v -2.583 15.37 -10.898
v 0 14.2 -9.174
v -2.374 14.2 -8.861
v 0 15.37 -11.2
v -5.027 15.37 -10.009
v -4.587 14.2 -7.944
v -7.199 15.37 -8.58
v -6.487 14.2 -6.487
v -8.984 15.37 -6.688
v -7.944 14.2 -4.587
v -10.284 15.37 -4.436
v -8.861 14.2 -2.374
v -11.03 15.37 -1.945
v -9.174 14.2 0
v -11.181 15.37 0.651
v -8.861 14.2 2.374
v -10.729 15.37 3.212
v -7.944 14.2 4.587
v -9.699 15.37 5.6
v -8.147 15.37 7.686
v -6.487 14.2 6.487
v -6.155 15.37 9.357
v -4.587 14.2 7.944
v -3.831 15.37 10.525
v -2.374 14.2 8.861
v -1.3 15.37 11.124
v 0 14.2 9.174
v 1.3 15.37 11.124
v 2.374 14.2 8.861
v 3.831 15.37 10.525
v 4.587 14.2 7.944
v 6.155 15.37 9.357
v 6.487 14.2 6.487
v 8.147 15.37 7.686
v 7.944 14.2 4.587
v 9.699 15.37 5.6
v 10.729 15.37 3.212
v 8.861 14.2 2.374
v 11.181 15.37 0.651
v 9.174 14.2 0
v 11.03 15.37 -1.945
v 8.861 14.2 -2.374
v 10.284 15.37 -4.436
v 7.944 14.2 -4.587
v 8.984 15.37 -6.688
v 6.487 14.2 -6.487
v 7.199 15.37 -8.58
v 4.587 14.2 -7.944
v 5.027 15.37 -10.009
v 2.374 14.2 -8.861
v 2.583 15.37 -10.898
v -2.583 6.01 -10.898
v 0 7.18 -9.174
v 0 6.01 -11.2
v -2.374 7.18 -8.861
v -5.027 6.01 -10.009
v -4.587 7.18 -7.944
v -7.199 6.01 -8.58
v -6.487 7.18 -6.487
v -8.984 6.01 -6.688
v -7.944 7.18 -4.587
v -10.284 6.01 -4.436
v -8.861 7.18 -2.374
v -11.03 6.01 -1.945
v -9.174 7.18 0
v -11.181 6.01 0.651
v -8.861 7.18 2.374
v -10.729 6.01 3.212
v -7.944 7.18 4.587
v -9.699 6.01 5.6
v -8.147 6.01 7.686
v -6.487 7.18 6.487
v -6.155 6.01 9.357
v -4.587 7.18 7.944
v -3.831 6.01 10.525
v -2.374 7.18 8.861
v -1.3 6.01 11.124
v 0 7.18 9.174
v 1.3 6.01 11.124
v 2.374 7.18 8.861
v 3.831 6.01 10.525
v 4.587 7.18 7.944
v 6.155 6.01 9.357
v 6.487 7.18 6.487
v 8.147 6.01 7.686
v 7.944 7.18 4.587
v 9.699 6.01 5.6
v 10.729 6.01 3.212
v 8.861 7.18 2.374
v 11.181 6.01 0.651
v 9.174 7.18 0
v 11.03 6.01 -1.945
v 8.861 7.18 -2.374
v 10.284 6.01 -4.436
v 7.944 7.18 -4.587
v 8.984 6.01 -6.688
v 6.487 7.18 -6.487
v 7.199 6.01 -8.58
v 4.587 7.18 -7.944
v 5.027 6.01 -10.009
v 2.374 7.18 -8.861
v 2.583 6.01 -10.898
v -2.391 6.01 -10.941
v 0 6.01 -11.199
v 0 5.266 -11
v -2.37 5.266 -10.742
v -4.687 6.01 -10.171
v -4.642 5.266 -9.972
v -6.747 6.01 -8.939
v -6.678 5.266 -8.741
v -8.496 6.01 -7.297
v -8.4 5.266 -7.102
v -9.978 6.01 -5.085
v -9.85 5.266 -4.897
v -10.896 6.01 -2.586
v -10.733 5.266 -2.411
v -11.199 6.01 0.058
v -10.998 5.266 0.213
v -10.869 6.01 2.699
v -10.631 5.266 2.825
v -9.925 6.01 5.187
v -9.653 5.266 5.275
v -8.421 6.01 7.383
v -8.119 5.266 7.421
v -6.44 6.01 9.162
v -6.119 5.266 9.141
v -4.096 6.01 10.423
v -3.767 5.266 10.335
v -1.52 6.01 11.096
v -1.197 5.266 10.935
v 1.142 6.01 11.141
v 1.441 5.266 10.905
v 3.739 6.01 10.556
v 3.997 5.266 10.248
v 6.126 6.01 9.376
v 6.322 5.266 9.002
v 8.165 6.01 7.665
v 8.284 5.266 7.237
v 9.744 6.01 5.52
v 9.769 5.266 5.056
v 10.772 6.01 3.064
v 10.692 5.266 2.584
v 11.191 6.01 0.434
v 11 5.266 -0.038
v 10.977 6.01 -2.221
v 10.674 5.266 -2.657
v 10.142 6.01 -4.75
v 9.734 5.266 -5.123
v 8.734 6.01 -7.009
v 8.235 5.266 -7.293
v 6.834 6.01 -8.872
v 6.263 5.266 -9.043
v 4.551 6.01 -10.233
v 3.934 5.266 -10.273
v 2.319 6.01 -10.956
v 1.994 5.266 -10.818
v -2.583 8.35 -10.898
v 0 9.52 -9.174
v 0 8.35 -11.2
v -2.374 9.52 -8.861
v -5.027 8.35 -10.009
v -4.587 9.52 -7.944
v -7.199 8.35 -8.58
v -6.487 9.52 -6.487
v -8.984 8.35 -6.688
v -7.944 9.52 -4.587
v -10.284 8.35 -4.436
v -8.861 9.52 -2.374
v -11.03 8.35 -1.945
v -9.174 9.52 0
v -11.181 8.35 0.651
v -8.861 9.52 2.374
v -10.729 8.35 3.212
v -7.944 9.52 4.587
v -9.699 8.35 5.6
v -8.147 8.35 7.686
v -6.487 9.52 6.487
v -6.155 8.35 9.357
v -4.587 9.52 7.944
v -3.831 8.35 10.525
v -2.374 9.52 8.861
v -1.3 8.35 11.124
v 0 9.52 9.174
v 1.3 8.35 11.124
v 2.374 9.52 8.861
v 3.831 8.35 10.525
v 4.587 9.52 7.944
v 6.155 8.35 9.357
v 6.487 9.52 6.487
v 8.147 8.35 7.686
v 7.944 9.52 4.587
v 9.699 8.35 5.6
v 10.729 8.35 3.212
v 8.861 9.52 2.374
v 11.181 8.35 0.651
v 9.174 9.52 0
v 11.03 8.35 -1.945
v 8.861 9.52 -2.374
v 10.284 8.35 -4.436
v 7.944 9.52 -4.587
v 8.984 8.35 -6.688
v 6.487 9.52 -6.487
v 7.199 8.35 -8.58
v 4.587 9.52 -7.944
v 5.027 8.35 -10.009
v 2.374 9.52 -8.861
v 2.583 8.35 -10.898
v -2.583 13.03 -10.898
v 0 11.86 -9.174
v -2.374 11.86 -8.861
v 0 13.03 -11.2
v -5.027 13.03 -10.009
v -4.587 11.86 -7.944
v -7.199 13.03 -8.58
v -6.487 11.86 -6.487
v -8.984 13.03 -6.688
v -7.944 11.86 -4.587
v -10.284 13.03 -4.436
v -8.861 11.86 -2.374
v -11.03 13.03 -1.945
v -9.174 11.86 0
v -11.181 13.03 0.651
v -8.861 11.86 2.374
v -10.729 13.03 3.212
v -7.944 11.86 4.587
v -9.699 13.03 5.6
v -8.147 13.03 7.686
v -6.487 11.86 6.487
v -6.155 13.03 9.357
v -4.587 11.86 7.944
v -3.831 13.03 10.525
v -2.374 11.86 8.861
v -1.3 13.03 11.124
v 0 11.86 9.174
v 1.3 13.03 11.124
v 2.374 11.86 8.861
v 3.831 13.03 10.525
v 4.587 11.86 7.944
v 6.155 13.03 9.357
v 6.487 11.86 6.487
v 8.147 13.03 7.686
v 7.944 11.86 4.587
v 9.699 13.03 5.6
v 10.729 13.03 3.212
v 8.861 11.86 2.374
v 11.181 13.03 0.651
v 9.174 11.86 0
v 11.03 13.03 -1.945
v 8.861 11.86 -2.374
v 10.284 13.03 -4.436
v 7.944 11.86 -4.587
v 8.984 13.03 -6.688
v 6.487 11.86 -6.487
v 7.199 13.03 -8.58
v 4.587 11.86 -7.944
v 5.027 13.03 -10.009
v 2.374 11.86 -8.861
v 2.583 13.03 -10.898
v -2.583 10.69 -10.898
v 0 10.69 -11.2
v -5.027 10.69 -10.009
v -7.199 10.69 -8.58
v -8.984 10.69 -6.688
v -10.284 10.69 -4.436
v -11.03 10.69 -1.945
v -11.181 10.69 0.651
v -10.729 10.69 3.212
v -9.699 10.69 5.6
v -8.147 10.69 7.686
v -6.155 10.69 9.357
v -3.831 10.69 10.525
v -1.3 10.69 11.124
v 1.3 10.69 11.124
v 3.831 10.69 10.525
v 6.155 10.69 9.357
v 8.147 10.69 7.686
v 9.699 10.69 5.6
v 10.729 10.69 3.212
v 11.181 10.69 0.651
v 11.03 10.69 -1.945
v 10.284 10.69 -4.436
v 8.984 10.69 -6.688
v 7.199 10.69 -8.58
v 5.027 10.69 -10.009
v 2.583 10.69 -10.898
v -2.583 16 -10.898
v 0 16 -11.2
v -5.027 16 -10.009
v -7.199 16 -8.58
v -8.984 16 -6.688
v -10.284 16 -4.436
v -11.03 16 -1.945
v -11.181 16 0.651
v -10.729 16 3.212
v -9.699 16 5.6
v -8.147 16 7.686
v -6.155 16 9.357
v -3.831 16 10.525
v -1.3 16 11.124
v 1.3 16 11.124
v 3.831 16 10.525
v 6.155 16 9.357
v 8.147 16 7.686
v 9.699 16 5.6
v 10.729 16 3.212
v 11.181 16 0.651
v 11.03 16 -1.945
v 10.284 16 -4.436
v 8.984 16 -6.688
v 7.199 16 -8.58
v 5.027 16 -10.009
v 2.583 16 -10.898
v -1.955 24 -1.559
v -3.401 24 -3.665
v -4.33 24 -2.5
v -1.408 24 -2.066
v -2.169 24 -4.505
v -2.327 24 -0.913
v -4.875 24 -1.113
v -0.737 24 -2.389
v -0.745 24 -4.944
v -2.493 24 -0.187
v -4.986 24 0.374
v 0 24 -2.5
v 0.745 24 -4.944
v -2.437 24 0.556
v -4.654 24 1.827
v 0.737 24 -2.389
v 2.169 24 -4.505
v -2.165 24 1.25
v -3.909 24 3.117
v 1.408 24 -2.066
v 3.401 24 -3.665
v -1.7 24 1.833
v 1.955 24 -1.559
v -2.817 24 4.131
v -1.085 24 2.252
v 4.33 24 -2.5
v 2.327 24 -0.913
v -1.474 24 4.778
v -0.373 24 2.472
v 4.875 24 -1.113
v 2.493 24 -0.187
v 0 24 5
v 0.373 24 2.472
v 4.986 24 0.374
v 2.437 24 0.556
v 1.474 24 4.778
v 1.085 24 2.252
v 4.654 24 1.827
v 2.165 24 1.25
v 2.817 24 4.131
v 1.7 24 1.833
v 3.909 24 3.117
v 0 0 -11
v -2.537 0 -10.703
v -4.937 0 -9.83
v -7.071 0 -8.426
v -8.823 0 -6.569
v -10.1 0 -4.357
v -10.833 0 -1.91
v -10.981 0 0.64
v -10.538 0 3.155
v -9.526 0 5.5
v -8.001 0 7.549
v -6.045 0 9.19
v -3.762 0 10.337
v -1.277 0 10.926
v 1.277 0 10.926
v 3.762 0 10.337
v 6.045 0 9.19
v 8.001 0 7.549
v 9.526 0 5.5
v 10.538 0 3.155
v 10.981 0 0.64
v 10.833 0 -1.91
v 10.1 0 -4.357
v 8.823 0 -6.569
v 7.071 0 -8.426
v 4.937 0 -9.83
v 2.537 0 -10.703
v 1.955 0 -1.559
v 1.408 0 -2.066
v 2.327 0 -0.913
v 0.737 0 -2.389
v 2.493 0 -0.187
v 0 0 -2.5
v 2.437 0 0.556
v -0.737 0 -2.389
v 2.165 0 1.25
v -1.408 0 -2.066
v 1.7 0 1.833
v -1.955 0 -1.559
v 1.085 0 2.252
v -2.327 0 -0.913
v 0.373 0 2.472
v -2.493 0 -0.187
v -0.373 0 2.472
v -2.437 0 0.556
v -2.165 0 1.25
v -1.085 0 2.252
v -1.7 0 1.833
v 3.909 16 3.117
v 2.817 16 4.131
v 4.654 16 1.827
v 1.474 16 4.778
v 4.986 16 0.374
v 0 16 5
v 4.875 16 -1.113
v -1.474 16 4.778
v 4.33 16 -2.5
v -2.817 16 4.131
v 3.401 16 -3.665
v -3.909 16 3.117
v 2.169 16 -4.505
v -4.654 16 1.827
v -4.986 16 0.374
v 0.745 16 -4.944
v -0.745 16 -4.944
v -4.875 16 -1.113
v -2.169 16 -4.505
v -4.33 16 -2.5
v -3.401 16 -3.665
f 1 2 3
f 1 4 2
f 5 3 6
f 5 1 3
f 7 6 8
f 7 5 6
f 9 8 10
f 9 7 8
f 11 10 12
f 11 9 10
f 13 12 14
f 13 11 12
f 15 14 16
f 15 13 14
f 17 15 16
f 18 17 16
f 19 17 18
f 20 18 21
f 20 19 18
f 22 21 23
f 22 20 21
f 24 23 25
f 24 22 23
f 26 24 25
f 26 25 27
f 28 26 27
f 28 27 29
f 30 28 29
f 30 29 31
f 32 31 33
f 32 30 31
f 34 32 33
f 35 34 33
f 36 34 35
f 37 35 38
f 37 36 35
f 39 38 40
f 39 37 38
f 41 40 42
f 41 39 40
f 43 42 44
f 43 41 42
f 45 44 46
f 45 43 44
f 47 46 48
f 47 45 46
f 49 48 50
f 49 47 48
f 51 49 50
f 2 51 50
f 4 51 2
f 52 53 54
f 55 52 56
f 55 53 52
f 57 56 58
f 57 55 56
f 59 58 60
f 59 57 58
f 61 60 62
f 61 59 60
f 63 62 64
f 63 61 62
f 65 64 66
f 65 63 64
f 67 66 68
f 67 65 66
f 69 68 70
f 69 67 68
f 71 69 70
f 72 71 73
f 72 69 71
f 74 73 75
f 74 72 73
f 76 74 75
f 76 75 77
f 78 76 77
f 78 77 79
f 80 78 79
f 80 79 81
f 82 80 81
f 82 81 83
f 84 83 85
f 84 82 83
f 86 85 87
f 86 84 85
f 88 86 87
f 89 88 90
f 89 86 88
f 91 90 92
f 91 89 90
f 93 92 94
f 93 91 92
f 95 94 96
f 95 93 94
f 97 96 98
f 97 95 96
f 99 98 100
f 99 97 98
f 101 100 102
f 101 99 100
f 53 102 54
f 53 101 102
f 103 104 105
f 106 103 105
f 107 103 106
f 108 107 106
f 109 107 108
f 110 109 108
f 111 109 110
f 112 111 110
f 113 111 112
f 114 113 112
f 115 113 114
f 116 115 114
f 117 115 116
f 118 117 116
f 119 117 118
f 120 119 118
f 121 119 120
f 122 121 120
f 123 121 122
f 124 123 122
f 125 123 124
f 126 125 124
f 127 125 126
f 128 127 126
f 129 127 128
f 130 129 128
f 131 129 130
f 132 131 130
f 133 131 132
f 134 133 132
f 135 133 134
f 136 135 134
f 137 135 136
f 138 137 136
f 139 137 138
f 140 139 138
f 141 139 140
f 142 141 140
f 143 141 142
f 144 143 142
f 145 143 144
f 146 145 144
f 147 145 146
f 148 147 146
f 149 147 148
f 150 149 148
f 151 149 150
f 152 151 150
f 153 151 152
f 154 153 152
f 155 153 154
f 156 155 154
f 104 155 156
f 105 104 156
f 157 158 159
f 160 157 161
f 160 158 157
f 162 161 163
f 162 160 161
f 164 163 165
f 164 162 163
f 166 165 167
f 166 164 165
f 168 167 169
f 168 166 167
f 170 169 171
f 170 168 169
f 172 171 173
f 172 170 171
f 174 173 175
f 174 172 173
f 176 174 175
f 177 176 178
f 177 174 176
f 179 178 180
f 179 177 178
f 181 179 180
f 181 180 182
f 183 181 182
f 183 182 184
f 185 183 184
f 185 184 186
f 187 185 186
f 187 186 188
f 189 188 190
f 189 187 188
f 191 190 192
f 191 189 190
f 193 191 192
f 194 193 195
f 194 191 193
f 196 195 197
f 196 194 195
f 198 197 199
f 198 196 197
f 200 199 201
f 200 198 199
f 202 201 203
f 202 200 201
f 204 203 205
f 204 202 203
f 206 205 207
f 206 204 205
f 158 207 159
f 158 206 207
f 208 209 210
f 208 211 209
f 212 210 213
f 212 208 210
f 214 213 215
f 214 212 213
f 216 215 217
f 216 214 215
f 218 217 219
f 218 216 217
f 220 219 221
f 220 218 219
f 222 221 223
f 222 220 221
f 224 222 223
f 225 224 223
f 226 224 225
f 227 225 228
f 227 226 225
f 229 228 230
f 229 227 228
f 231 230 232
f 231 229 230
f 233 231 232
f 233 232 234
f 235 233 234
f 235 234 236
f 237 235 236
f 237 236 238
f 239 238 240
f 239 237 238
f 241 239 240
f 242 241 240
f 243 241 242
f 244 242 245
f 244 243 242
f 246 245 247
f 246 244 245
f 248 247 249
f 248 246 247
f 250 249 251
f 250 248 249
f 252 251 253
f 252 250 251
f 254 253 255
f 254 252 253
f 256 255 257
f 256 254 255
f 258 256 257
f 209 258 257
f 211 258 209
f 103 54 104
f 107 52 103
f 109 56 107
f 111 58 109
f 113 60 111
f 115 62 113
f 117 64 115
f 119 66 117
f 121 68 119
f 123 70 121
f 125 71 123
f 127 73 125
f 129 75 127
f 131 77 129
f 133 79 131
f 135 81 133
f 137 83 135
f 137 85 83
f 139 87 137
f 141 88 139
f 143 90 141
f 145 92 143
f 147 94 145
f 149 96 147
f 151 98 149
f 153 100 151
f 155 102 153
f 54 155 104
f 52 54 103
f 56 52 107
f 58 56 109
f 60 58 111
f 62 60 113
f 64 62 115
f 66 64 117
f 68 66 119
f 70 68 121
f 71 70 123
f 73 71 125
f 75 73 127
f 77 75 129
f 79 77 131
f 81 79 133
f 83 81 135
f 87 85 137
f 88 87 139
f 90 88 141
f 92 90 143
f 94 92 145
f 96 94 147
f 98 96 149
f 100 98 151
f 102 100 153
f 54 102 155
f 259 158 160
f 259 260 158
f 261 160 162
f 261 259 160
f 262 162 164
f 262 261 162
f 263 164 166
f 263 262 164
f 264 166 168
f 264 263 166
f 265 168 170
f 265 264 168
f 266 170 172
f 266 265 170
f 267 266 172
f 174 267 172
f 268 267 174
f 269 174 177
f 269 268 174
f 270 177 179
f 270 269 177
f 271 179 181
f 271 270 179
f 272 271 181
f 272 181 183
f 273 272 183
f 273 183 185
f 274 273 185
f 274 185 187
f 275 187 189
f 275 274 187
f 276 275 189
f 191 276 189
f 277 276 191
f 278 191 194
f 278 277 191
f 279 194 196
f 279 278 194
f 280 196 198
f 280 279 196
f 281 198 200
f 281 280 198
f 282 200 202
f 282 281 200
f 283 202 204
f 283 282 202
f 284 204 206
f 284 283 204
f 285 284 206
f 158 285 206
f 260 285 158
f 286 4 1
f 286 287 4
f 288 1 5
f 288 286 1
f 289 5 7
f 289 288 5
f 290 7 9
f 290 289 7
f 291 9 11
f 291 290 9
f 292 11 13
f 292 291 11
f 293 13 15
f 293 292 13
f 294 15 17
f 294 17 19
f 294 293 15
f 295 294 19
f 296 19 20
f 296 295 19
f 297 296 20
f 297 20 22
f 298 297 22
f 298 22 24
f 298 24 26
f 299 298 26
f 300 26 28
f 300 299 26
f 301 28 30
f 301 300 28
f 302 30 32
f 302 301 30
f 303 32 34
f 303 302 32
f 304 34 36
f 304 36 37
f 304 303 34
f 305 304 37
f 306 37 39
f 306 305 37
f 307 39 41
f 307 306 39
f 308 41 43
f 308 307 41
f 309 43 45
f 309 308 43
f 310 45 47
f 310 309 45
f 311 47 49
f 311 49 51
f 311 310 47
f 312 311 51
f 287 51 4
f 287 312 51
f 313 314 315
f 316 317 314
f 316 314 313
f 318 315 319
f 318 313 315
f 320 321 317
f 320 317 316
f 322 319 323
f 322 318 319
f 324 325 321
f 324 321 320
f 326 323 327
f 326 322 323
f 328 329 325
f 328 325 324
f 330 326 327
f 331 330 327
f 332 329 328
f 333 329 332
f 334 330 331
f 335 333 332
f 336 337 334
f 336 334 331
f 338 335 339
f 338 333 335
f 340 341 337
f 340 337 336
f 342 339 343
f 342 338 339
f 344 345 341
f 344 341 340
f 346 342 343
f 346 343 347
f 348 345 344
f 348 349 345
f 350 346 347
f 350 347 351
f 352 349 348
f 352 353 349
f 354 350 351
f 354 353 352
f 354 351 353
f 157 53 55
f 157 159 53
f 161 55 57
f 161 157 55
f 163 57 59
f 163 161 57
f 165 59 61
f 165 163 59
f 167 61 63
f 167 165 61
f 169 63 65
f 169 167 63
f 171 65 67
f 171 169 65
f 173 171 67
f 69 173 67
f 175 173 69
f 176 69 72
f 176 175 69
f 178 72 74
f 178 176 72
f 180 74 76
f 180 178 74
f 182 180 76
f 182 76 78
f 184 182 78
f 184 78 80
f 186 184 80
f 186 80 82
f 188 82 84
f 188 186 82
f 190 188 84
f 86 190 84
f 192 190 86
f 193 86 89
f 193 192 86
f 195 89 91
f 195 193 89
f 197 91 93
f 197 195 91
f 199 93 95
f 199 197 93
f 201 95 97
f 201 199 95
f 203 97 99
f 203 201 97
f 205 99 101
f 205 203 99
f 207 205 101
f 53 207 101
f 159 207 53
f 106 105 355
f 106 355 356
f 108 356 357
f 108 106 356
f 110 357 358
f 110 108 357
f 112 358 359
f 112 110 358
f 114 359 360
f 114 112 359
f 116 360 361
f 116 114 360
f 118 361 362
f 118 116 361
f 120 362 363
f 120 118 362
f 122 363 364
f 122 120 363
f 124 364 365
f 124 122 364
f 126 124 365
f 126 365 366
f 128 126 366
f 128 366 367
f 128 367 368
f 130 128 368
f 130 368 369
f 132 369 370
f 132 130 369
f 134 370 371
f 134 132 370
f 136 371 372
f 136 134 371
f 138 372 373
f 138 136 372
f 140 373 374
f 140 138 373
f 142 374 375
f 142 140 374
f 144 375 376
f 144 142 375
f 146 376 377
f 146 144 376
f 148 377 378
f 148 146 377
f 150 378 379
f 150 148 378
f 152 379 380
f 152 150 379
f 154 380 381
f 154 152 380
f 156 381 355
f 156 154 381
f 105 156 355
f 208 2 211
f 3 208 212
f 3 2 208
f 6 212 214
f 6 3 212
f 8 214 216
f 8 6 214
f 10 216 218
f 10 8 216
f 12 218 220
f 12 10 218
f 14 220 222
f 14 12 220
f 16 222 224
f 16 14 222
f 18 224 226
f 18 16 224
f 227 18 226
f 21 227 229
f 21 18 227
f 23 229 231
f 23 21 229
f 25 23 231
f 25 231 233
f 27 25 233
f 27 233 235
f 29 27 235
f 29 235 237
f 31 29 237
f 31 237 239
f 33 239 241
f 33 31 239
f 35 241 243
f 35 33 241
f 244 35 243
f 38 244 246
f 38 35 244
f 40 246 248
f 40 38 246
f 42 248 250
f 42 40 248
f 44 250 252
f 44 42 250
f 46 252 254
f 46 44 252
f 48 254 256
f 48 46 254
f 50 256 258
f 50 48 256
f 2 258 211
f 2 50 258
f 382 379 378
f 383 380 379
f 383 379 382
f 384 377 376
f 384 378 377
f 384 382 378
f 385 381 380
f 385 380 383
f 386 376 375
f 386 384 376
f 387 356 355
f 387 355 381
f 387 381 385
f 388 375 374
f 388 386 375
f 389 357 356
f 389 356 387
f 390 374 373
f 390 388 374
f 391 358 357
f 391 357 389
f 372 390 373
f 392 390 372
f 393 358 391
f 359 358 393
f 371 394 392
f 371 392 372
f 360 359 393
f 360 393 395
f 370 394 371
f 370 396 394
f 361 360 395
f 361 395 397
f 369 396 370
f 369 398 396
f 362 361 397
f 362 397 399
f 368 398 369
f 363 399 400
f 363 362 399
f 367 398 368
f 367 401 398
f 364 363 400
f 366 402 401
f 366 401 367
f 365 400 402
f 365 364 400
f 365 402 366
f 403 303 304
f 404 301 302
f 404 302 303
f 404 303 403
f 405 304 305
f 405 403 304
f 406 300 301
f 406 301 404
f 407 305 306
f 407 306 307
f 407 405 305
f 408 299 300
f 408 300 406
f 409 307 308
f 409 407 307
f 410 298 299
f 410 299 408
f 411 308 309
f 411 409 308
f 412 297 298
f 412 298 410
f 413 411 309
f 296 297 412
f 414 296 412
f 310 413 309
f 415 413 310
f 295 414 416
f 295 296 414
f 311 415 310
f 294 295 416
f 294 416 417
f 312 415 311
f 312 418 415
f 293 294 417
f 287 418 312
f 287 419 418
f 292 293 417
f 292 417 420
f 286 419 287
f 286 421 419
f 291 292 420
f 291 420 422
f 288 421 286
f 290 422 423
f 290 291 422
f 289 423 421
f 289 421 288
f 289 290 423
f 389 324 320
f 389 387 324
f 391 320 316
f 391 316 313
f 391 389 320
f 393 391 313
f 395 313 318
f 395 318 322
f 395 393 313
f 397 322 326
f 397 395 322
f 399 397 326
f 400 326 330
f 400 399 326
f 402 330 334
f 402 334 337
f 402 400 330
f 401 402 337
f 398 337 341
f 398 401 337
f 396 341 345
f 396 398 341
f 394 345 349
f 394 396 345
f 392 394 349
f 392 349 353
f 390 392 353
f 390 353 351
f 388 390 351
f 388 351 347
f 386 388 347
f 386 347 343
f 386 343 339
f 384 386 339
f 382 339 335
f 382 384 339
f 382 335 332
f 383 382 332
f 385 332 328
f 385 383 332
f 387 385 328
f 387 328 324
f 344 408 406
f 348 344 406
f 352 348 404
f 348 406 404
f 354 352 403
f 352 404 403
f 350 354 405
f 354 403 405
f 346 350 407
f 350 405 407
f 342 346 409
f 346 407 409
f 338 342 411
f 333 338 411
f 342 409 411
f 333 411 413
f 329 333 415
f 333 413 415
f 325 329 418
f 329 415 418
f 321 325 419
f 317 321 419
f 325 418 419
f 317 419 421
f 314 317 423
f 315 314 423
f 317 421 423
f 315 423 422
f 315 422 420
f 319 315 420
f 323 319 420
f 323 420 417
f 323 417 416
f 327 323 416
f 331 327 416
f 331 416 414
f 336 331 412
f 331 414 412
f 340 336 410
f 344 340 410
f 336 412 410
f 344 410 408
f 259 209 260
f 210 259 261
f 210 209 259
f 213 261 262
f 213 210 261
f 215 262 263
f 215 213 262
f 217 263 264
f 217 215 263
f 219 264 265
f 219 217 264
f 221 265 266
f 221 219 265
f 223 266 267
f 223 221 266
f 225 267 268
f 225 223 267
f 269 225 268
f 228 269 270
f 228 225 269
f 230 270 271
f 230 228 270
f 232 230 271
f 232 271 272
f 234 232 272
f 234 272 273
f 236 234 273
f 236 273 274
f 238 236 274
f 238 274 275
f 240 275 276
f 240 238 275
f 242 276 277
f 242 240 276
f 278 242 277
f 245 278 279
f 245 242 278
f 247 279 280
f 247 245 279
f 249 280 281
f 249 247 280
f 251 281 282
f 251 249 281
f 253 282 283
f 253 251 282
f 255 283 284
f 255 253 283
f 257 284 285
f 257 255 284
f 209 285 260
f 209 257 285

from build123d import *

# Parameters (mm, degrees)
CHANFRO1_SIZE            = 0.23
CHANFRO1_SIZE2           = 0.628371686
ESBO_O2_R                = 5
ESBO_O2_R_2              = 2.5
RESSALTO_EXTRUS_O1_DEPTH = 8


with BuildPart() as part:
    # Esboço1 → Revolução1 (revolve)
    with BuildSketch(Plane.XY, mode=Mode.PRIVATE) as revolu_o1_sk:
        Polygon((11, 0), (11, 5.894529946), (11.2, 6.01), (9.173500555, 7.18), (11.2, 8.35), (9.173500555, 9.52), (11.2, 10.69), (9.173500555, 11.86), (11.2, 13.03), (9.173500555, 14.2), (11.2, 15.37), (11.2, 16), (2.5, 16), (2.5, 0), align=None)
    revolve(revolu_o1_sk.sketch.rotate(Axis((0, 0, 0), (0, 1, 0)), 90), axis=Axis((0, 0, 0), (0, 1, 0)))

    # Chanfro1
    chanfro1_edges = [part.edges().sort_by_distance(p)[0] for p in [
        (0, 5.894529946, 11),
    ]]
    chanfro1_side = [part.faces().sort_by_distance(p)[0] for p in [
        (0, 5.952264973, 11.1),
    ]]
    chamfer(chanfro1_edges, length=CHANFRO1_SIZE, length2=CHANFRO1_SIZE2, reference=chanfro1_side[0])

    # Esboço2 → Ressalto-extrusão1 (add)
    with BuildSketch(Plane(origin=(0, 16, 0), x_dir=(1, 0, 0), z_dir=(0, 1, 0))):
        with Locations(Location((0, 0, 0), (0, 0, 270))):
            Circle(ESBO_O2_R)
        with Locations(Location((0, 0, 0), (0, 0, 90))):
            Circle(ESBO_O2_R_2, mode=Mode.SUBTRACT)
    extrude(amount=RESSALTO_EXTRUS_O1_DEPTH)


solid = part.part
